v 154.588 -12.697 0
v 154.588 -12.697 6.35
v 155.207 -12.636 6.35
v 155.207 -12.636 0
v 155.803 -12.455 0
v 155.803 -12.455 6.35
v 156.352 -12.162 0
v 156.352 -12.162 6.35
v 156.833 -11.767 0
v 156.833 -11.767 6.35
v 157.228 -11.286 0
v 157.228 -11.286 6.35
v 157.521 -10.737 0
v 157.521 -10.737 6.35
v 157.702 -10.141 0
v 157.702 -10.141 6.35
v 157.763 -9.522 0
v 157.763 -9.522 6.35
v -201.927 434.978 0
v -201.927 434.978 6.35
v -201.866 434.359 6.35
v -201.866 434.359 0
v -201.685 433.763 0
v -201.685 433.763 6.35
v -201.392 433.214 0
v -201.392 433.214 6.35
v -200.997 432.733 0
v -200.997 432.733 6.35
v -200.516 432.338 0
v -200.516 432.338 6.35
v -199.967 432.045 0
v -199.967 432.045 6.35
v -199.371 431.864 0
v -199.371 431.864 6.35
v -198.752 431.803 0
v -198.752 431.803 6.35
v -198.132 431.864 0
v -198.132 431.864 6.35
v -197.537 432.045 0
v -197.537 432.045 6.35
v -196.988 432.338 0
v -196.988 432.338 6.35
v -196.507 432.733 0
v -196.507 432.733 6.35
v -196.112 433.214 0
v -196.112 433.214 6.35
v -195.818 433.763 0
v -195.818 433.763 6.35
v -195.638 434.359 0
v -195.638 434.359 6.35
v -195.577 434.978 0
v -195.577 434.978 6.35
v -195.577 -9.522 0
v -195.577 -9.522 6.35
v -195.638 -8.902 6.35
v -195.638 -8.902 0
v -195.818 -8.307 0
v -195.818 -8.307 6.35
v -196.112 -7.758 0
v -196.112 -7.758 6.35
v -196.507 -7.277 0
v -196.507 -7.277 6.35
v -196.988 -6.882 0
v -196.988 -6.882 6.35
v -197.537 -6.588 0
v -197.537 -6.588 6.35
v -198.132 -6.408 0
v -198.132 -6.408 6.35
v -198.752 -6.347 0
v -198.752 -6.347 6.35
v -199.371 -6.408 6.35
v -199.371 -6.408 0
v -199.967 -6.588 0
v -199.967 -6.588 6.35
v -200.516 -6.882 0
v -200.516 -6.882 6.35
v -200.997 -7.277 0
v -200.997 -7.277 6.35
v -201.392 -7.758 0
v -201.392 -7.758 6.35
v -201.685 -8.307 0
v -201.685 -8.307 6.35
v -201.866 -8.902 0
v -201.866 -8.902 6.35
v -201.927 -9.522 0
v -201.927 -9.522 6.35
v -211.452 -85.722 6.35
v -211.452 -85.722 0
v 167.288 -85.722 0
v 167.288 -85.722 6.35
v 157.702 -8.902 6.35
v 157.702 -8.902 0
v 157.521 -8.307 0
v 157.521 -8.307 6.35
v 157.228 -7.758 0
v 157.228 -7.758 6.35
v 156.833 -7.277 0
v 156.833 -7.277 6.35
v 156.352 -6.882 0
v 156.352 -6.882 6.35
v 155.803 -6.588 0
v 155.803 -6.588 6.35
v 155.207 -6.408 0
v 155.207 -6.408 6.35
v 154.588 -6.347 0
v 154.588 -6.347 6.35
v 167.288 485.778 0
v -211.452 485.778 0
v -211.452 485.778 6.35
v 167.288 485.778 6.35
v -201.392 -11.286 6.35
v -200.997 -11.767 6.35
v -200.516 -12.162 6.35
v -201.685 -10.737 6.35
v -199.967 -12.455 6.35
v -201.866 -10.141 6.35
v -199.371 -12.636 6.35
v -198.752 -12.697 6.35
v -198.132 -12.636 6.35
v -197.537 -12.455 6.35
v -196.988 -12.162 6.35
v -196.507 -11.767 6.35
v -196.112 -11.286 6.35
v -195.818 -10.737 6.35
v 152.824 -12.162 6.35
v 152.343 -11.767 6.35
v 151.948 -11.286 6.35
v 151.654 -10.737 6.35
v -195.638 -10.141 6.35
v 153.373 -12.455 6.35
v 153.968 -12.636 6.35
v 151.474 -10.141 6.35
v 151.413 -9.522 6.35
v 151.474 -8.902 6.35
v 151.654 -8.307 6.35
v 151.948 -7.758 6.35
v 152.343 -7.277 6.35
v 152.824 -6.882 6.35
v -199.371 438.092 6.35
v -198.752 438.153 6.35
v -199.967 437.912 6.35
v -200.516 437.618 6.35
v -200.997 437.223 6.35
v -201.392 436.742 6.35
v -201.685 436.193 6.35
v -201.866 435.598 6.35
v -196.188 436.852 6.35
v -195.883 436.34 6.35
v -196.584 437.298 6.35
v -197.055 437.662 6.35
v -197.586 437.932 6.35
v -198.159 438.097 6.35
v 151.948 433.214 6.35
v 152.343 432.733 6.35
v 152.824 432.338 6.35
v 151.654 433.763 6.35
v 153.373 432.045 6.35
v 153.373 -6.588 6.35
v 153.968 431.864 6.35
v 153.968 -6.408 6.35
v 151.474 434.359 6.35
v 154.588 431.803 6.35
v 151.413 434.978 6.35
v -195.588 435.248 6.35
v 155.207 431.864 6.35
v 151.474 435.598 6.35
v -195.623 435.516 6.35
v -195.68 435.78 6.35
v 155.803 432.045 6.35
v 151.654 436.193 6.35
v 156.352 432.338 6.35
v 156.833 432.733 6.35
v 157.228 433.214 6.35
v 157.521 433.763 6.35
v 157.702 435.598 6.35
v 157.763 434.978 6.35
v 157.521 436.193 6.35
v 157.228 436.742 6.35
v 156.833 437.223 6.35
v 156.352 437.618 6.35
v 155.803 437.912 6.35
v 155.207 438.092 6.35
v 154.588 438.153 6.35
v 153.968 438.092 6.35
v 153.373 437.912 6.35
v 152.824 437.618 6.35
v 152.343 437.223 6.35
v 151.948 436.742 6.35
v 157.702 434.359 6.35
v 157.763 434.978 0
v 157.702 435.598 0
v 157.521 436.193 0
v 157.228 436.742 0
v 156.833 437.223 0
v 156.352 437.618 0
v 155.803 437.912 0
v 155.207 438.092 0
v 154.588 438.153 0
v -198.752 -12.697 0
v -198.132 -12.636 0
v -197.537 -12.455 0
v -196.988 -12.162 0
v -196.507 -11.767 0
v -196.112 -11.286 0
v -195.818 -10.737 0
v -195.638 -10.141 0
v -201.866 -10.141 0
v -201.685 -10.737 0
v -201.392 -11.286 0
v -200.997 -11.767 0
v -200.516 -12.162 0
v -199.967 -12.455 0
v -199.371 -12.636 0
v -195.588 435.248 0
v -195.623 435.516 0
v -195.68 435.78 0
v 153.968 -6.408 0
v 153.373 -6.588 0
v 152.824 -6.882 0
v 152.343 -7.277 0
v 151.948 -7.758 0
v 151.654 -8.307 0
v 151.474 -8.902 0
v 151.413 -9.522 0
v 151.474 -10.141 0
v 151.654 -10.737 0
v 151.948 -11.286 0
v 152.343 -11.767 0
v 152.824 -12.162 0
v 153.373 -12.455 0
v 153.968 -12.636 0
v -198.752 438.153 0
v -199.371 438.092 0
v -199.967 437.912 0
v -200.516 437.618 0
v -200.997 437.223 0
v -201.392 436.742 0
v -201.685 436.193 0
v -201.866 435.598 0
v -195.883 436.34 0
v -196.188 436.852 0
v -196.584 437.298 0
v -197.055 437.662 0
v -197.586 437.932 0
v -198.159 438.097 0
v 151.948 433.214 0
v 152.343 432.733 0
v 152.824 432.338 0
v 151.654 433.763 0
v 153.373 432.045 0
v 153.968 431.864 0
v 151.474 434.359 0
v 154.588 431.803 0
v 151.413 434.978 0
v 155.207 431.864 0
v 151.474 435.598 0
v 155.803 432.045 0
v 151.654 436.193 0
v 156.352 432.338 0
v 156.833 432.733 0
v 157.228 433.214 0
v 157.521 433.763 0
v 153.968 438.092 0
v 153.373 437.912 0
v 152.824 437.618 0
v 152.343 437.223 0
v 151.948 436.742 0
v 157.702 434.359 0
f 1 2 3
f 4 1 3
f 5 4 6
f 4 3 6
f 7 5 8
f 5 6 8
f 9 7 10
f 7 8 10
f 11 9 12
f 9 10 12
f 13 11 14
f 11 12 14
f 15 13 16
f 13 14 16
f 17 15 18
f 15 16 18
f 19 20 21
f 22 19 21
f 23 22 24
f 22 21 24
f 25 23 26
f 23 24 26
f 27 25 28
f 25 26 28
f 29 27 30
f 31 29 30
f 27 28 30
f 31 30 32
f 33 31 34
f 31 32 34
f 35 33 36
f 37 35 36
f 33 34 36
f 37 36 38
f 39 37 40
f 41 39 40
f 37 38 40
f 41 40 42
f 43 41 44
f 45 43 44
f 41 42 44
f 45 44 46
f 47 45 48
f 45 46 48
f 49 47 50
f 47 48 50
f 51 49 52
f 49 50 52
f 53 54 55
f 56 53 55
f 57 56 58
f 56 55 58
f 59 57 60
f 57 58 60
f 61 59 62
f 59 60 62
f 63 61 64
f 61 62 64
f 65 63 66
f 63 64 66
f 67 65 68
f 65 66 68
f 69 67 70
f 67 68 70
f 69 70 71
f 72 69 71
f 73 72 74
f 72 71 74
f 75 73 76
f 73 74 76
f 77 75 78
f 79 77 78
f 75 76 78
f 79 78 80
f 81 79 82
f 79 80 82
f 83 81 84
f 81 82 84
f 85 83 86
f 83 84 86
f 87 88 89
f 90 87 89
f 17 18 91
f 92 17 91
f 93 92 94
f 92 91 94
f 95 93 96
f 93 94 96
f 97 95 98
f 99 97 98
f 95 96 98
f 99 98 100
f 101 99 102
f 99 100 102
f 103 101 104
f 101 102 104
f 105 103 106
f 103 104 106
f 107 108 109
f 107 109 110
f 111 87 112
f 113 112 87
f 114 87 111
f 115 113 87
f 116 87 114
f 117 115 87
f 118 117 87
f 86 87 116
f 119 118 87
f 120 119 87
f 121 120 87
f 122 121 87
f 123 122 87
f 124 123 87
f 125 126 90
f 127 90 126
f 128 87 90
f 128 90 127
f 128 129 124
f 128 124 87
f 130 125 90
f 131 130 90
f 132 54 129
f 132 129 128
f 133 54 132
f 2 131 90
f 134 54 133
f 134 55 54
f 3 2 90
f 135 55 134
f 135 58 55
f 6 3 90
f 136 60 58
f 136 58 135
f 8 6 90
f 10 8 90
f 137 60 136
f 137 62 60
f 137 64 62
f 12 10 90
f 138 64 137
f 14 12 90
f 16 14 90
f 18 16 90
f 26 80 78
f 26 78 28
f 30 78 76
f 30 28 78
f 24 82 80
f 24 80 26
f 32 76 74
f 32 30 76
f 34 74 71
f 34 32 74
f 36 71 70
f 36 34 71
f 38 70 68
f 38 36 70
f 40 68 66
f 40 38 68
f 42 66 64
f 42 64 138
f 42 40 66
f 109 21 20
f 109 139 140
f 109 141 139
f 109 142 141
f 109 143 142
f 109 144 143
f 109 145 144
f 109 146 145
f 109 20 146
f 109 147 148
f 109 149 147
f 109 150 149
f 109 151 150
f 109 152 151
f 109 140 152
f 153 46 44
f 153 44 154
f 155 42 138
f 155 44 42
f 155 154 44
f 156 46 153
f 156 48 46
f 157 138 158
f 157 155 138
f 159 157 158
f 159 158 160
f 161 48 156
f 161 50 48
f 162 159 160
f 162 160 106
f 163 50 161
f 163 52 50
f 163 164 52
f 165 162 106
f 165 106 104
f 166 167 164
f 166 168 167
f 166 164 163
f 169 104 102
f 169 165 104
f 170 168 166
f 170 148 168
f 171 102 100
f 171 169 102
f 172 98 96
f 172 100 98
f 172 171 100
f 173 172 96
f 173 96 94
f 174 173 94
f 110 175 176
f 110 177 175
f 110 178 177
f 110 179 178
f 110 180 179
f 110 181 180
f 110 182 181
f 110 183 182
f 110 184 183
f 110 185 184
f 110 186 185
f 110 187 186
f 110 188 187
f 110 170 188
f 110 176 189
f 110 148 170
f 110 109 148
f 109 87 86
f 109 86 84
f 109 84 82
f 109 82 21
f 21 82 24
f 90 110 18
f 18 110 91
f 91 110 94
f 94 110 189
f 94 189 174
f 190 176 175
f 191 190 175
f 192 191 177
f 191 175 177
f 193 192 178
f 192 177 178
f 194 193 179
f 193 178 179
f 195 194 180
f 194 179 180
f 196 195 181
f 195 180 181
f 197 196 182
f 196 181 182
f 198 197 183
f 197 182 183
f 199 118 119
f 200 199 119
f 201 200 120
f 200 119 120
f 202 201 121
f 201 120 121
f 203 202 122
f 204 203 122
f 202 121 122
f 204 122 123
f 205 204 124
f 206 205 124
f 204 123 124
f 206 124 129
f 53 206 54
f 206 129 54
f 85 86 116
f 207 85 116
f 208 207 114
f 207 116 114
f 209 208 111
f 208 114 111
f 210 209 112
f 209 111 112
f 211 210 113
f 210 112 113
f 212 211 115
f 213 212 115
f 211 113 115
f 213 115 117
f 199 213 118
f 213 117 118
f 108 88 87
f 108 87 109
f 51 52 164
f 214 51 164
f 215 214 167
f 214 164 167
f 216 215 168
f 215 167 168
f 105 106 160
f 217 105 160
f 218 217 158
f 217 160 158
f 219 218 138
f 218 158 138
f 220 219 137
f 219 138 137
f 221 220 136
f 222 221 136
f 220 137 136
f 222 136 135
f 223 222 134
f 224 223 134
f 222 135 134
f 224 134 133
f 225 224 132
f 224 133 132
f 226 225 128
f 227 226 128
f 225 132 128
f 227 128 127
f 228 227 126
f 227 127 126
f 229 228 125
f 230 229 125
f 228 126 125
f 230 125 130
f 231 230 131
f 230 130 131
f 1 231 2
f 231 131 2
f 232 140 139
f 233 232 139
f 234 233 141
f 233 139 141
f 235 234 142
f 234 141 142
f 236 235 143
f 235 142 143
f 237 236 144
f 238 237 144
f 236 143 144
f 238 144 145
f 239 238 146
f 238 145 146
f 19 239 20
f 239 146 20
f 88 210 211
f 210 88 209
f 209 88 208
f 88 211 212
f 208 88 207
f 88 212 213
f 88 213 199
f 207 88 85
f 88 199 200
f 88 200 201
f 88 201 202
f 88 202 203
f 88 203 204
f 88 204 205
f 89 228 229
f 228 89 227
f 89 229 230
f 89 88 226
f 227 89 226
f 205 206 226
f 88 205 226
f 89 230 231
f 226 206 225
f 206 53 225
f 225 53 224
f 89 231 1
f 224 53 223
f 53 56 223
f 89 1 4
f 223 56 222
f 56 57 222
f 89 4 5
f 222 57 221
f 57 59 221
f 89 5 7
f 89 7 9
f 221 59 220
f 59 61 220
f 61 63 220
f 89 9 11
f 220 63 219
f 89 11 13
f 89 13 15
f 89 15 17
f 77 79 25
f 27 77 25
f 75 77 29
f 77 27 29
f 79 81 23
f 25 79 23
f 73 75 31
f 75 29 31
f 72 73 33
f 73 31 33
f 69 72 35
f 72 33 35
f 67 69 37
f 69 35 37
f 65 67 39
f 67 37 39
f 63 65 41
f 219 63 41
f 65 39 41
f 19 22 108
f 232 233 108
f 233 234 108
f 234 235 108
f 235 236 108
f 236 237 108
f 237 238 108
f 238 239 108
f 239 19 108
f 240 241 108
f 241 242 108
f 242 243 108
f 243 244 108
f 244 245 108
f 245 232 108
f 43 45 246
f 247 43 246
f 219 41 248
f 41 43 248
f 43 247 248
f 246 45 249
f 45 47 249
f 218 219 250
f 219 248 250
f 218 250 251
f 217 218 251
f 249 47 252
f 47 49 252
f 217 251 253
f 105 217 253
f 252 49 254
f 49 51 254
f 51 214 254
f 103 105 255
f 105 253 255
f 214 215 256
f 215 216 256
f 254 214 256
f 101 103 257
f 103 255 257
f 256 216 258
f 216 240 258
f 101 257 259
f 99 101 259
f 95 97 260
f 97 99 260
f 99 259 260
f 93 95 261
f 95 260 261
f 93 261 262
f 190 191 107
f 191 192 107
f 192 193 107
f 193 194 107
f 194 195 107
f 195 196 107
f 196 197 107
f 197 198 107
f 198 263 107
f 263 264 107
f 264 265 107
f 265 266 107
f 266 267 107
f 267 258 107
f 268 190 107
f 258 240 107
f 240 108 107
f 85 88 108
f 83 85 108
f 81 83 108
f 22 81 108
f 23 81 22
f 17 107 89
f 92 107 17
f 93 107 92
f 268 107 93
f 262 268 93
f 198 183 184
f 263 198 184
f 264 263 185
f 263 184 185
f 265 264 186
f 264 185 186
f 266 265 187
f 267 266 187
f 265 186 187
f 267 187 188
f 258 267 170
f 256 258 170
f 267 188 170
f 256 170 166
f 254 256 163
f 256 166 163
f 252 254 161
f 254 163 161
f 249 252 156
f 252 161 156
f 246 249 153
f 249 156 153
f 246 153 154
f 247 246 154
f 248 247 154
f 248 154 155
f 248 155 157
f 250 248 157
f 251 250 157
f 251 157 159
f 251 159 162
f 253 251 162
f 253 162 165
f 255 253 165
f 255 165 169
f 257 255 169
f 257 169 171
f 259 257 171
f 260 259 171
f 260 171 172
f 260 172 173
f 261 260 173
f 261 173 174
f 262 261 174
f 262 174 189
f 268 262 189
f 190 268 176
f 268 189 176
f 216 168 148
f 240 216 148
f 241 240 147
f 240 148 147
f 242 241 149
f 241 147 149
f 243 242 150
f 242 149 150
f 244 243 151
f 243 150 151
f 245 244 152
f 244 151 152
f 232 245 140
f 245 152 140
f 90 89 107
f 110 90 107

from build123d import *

# Parameters (mm, degrees)
F0_W     = 378.7394
F0_H     = 571.5
F1_DEPTH = 6.35
F3_DEPTH = 6.351


# Not quite as in the source:
# - a length typed as a fraction of an inch, garbled in the dataset ("3 / 203.2 mm" for 3/8 in), is restored


with BuildPart() as f1:
    # F0 (on Top) → F1 (new body)
    with BuildSketch(Plane.XY):
        with Locations((-22.0819663584, 200.0282000497)):
            Rectangle(F0_W, F0_H)
    extrude(amount=F1_DEPTH)

    # F2 (on face) → F3 (cut, through all)
    with BuildSketch(Plane.XY.offset(6.35)):
        with BuildLine():
            ThreePointArc((-201.9266663584, 434.9782000497), (-198.7516663584, 431.8032000497), (-195.5766663584, 434.9782000497))
            ThreePointArc((-195.5766663584, 434.9782000497), (-195.6025010735, 435.3824066906), (-195.679584789, 435.7800353388))
            Line((-195.679584789, 435.7800353388), (-198.7516663584, 434.9782000497))
            Line((-198.7516663584, 434.9782000497), (-201.9266663584, 434.9782000497))
        make_face()
        with BuildLine():
            Line((-198.7516663584, 434.9782000497), (-195.679584789, 435.7800353388))
            ThreePointArc((-195.679584789, 435.7800353388), (-196.8106874872, 437.4908134345), (-198.7516663584, 438.1532000497))
            Line((-198.7516663584, 438.1532000497), (-198.7516663584, 434.9782000497))
        make_face()
        with BuildLine():
            ThreePointArc((-198.7516663584, 438.1532000497), (-200.9967303887, 437.22326408), (-201.9266663584, 434.9782000497))
            Line((-201.9266663584, 434.9782000497), (-198.7516663584, 434.9782000497))
            Line((-198.7516663584, 434.9782000497), (-198.7516663584, 438.1532000497))
        make_face()
        with BuildLine():
            Line((154.5877336416, 434.9782000497), (157.7627336416, 434.9782000497))
            ThreePointArc((157.7627336416, 434.9782000497), (156.8327976718, 437.22326408), (154.5877336416, 438.1532000497))
            Line((154.5877336416, 438.1532000497), (154.5877336416, 434.9782000497))
        make_face()
        with BuildLine():
            ThreePointArc((154.5877336416, 438.1532000497), (152.3426696113, 432.7331360195), (157.7627336416, 434.9782000497))
            Line((157.7627336416, 434.9782000497), (154.5877336416, 434.9782000497))
            Line((154.5877336416, 434.9782000497), (154.5877336416, 438.1532000497))
        make_face()
        with BuildLine():
            ThreePointArc((-198.7516663584, -12.6967999503), (-196.5066023282, -11.7668639805), (-195.5766663584, -9.5217999503))
            ThreePointArc((-195.5766663584, -9.5217999503), (-196.5066023282, -7.27673592), (-198.7516663584, -6.3467999503))
            Line((-198.7516663584, -6.3467999503), (-198.7516663584, -9.5217999503))
            Line((-198.7516663584, -9.5217999503), (-198.7516663584, -12.6967999503))
        make_face()
        with BuildLine():
            Line((-198.7516663584, -9.5217999503), (-198.7516663584, -6.3467999503))
            ThreePointArc((-198.7516663584, -6.3467999503), (-200.9967303887, -7.27673592), (-201.9266663584, -9.5217999503))
            Line((-201.9266663584, -9.5217999503), (-198.7516663584, -9.5217999503))
        make_face()
        with BuildLine():
            ThreePointArc((-201.9266663584, -9.5217999503), (-200.9967303887, -11.7668639805), (-198.7516663584, -12.6967999503))
            Line((-198.7516663584, -12.6967999503), (-198.7516663584, -9.5217999503))
            Line((-198.7516663584, -9.5217999503), (-201.9266663584, -9.5217999503))
        make_face()
        with BuildLine():
            Line((154.5877336416, -9.5217999503), (157.7627336416, -9.5217999503))
            ThreePointArc((157.7627336416, -9.5217999503), (156.8327976718, -7.27673592), (154.5877336416, -6.3467999503))
            Line((154.5877336416, -6.3467999503), (154.5877336416, -9.5217999503))
        make_face()
        with BuildLine():
            ThreePointArc((154.5877336416, -12.6967999503), (156.8327976718, -11.7668639805), (157.7627336416, -9.5217999503))
            Line((157.7627336416, -9.5217999503), (154.5877336416, -9.5217999503))
            Line((154.5877336416, -9.5217999503), (154.5877336416, -12.6967999503))
        make_face()
        with BuildLine():
            Line((154.5877336416, -9.5217999503), (154.5877336416, -6.3467999503))
            ThreePointArc((154.5877336416, -6.3467999503), (151.4127336416, -9.5217999503), (154.5877336416, -12.6967999503))
            Line((154.5877336416, -12.6967999503), (154.5877336416, -9.5217999503))
        make_face()
    extrude(amount=-F3_DEPTH, mode=Mode.SUBTRACT)


solid = f1.part
